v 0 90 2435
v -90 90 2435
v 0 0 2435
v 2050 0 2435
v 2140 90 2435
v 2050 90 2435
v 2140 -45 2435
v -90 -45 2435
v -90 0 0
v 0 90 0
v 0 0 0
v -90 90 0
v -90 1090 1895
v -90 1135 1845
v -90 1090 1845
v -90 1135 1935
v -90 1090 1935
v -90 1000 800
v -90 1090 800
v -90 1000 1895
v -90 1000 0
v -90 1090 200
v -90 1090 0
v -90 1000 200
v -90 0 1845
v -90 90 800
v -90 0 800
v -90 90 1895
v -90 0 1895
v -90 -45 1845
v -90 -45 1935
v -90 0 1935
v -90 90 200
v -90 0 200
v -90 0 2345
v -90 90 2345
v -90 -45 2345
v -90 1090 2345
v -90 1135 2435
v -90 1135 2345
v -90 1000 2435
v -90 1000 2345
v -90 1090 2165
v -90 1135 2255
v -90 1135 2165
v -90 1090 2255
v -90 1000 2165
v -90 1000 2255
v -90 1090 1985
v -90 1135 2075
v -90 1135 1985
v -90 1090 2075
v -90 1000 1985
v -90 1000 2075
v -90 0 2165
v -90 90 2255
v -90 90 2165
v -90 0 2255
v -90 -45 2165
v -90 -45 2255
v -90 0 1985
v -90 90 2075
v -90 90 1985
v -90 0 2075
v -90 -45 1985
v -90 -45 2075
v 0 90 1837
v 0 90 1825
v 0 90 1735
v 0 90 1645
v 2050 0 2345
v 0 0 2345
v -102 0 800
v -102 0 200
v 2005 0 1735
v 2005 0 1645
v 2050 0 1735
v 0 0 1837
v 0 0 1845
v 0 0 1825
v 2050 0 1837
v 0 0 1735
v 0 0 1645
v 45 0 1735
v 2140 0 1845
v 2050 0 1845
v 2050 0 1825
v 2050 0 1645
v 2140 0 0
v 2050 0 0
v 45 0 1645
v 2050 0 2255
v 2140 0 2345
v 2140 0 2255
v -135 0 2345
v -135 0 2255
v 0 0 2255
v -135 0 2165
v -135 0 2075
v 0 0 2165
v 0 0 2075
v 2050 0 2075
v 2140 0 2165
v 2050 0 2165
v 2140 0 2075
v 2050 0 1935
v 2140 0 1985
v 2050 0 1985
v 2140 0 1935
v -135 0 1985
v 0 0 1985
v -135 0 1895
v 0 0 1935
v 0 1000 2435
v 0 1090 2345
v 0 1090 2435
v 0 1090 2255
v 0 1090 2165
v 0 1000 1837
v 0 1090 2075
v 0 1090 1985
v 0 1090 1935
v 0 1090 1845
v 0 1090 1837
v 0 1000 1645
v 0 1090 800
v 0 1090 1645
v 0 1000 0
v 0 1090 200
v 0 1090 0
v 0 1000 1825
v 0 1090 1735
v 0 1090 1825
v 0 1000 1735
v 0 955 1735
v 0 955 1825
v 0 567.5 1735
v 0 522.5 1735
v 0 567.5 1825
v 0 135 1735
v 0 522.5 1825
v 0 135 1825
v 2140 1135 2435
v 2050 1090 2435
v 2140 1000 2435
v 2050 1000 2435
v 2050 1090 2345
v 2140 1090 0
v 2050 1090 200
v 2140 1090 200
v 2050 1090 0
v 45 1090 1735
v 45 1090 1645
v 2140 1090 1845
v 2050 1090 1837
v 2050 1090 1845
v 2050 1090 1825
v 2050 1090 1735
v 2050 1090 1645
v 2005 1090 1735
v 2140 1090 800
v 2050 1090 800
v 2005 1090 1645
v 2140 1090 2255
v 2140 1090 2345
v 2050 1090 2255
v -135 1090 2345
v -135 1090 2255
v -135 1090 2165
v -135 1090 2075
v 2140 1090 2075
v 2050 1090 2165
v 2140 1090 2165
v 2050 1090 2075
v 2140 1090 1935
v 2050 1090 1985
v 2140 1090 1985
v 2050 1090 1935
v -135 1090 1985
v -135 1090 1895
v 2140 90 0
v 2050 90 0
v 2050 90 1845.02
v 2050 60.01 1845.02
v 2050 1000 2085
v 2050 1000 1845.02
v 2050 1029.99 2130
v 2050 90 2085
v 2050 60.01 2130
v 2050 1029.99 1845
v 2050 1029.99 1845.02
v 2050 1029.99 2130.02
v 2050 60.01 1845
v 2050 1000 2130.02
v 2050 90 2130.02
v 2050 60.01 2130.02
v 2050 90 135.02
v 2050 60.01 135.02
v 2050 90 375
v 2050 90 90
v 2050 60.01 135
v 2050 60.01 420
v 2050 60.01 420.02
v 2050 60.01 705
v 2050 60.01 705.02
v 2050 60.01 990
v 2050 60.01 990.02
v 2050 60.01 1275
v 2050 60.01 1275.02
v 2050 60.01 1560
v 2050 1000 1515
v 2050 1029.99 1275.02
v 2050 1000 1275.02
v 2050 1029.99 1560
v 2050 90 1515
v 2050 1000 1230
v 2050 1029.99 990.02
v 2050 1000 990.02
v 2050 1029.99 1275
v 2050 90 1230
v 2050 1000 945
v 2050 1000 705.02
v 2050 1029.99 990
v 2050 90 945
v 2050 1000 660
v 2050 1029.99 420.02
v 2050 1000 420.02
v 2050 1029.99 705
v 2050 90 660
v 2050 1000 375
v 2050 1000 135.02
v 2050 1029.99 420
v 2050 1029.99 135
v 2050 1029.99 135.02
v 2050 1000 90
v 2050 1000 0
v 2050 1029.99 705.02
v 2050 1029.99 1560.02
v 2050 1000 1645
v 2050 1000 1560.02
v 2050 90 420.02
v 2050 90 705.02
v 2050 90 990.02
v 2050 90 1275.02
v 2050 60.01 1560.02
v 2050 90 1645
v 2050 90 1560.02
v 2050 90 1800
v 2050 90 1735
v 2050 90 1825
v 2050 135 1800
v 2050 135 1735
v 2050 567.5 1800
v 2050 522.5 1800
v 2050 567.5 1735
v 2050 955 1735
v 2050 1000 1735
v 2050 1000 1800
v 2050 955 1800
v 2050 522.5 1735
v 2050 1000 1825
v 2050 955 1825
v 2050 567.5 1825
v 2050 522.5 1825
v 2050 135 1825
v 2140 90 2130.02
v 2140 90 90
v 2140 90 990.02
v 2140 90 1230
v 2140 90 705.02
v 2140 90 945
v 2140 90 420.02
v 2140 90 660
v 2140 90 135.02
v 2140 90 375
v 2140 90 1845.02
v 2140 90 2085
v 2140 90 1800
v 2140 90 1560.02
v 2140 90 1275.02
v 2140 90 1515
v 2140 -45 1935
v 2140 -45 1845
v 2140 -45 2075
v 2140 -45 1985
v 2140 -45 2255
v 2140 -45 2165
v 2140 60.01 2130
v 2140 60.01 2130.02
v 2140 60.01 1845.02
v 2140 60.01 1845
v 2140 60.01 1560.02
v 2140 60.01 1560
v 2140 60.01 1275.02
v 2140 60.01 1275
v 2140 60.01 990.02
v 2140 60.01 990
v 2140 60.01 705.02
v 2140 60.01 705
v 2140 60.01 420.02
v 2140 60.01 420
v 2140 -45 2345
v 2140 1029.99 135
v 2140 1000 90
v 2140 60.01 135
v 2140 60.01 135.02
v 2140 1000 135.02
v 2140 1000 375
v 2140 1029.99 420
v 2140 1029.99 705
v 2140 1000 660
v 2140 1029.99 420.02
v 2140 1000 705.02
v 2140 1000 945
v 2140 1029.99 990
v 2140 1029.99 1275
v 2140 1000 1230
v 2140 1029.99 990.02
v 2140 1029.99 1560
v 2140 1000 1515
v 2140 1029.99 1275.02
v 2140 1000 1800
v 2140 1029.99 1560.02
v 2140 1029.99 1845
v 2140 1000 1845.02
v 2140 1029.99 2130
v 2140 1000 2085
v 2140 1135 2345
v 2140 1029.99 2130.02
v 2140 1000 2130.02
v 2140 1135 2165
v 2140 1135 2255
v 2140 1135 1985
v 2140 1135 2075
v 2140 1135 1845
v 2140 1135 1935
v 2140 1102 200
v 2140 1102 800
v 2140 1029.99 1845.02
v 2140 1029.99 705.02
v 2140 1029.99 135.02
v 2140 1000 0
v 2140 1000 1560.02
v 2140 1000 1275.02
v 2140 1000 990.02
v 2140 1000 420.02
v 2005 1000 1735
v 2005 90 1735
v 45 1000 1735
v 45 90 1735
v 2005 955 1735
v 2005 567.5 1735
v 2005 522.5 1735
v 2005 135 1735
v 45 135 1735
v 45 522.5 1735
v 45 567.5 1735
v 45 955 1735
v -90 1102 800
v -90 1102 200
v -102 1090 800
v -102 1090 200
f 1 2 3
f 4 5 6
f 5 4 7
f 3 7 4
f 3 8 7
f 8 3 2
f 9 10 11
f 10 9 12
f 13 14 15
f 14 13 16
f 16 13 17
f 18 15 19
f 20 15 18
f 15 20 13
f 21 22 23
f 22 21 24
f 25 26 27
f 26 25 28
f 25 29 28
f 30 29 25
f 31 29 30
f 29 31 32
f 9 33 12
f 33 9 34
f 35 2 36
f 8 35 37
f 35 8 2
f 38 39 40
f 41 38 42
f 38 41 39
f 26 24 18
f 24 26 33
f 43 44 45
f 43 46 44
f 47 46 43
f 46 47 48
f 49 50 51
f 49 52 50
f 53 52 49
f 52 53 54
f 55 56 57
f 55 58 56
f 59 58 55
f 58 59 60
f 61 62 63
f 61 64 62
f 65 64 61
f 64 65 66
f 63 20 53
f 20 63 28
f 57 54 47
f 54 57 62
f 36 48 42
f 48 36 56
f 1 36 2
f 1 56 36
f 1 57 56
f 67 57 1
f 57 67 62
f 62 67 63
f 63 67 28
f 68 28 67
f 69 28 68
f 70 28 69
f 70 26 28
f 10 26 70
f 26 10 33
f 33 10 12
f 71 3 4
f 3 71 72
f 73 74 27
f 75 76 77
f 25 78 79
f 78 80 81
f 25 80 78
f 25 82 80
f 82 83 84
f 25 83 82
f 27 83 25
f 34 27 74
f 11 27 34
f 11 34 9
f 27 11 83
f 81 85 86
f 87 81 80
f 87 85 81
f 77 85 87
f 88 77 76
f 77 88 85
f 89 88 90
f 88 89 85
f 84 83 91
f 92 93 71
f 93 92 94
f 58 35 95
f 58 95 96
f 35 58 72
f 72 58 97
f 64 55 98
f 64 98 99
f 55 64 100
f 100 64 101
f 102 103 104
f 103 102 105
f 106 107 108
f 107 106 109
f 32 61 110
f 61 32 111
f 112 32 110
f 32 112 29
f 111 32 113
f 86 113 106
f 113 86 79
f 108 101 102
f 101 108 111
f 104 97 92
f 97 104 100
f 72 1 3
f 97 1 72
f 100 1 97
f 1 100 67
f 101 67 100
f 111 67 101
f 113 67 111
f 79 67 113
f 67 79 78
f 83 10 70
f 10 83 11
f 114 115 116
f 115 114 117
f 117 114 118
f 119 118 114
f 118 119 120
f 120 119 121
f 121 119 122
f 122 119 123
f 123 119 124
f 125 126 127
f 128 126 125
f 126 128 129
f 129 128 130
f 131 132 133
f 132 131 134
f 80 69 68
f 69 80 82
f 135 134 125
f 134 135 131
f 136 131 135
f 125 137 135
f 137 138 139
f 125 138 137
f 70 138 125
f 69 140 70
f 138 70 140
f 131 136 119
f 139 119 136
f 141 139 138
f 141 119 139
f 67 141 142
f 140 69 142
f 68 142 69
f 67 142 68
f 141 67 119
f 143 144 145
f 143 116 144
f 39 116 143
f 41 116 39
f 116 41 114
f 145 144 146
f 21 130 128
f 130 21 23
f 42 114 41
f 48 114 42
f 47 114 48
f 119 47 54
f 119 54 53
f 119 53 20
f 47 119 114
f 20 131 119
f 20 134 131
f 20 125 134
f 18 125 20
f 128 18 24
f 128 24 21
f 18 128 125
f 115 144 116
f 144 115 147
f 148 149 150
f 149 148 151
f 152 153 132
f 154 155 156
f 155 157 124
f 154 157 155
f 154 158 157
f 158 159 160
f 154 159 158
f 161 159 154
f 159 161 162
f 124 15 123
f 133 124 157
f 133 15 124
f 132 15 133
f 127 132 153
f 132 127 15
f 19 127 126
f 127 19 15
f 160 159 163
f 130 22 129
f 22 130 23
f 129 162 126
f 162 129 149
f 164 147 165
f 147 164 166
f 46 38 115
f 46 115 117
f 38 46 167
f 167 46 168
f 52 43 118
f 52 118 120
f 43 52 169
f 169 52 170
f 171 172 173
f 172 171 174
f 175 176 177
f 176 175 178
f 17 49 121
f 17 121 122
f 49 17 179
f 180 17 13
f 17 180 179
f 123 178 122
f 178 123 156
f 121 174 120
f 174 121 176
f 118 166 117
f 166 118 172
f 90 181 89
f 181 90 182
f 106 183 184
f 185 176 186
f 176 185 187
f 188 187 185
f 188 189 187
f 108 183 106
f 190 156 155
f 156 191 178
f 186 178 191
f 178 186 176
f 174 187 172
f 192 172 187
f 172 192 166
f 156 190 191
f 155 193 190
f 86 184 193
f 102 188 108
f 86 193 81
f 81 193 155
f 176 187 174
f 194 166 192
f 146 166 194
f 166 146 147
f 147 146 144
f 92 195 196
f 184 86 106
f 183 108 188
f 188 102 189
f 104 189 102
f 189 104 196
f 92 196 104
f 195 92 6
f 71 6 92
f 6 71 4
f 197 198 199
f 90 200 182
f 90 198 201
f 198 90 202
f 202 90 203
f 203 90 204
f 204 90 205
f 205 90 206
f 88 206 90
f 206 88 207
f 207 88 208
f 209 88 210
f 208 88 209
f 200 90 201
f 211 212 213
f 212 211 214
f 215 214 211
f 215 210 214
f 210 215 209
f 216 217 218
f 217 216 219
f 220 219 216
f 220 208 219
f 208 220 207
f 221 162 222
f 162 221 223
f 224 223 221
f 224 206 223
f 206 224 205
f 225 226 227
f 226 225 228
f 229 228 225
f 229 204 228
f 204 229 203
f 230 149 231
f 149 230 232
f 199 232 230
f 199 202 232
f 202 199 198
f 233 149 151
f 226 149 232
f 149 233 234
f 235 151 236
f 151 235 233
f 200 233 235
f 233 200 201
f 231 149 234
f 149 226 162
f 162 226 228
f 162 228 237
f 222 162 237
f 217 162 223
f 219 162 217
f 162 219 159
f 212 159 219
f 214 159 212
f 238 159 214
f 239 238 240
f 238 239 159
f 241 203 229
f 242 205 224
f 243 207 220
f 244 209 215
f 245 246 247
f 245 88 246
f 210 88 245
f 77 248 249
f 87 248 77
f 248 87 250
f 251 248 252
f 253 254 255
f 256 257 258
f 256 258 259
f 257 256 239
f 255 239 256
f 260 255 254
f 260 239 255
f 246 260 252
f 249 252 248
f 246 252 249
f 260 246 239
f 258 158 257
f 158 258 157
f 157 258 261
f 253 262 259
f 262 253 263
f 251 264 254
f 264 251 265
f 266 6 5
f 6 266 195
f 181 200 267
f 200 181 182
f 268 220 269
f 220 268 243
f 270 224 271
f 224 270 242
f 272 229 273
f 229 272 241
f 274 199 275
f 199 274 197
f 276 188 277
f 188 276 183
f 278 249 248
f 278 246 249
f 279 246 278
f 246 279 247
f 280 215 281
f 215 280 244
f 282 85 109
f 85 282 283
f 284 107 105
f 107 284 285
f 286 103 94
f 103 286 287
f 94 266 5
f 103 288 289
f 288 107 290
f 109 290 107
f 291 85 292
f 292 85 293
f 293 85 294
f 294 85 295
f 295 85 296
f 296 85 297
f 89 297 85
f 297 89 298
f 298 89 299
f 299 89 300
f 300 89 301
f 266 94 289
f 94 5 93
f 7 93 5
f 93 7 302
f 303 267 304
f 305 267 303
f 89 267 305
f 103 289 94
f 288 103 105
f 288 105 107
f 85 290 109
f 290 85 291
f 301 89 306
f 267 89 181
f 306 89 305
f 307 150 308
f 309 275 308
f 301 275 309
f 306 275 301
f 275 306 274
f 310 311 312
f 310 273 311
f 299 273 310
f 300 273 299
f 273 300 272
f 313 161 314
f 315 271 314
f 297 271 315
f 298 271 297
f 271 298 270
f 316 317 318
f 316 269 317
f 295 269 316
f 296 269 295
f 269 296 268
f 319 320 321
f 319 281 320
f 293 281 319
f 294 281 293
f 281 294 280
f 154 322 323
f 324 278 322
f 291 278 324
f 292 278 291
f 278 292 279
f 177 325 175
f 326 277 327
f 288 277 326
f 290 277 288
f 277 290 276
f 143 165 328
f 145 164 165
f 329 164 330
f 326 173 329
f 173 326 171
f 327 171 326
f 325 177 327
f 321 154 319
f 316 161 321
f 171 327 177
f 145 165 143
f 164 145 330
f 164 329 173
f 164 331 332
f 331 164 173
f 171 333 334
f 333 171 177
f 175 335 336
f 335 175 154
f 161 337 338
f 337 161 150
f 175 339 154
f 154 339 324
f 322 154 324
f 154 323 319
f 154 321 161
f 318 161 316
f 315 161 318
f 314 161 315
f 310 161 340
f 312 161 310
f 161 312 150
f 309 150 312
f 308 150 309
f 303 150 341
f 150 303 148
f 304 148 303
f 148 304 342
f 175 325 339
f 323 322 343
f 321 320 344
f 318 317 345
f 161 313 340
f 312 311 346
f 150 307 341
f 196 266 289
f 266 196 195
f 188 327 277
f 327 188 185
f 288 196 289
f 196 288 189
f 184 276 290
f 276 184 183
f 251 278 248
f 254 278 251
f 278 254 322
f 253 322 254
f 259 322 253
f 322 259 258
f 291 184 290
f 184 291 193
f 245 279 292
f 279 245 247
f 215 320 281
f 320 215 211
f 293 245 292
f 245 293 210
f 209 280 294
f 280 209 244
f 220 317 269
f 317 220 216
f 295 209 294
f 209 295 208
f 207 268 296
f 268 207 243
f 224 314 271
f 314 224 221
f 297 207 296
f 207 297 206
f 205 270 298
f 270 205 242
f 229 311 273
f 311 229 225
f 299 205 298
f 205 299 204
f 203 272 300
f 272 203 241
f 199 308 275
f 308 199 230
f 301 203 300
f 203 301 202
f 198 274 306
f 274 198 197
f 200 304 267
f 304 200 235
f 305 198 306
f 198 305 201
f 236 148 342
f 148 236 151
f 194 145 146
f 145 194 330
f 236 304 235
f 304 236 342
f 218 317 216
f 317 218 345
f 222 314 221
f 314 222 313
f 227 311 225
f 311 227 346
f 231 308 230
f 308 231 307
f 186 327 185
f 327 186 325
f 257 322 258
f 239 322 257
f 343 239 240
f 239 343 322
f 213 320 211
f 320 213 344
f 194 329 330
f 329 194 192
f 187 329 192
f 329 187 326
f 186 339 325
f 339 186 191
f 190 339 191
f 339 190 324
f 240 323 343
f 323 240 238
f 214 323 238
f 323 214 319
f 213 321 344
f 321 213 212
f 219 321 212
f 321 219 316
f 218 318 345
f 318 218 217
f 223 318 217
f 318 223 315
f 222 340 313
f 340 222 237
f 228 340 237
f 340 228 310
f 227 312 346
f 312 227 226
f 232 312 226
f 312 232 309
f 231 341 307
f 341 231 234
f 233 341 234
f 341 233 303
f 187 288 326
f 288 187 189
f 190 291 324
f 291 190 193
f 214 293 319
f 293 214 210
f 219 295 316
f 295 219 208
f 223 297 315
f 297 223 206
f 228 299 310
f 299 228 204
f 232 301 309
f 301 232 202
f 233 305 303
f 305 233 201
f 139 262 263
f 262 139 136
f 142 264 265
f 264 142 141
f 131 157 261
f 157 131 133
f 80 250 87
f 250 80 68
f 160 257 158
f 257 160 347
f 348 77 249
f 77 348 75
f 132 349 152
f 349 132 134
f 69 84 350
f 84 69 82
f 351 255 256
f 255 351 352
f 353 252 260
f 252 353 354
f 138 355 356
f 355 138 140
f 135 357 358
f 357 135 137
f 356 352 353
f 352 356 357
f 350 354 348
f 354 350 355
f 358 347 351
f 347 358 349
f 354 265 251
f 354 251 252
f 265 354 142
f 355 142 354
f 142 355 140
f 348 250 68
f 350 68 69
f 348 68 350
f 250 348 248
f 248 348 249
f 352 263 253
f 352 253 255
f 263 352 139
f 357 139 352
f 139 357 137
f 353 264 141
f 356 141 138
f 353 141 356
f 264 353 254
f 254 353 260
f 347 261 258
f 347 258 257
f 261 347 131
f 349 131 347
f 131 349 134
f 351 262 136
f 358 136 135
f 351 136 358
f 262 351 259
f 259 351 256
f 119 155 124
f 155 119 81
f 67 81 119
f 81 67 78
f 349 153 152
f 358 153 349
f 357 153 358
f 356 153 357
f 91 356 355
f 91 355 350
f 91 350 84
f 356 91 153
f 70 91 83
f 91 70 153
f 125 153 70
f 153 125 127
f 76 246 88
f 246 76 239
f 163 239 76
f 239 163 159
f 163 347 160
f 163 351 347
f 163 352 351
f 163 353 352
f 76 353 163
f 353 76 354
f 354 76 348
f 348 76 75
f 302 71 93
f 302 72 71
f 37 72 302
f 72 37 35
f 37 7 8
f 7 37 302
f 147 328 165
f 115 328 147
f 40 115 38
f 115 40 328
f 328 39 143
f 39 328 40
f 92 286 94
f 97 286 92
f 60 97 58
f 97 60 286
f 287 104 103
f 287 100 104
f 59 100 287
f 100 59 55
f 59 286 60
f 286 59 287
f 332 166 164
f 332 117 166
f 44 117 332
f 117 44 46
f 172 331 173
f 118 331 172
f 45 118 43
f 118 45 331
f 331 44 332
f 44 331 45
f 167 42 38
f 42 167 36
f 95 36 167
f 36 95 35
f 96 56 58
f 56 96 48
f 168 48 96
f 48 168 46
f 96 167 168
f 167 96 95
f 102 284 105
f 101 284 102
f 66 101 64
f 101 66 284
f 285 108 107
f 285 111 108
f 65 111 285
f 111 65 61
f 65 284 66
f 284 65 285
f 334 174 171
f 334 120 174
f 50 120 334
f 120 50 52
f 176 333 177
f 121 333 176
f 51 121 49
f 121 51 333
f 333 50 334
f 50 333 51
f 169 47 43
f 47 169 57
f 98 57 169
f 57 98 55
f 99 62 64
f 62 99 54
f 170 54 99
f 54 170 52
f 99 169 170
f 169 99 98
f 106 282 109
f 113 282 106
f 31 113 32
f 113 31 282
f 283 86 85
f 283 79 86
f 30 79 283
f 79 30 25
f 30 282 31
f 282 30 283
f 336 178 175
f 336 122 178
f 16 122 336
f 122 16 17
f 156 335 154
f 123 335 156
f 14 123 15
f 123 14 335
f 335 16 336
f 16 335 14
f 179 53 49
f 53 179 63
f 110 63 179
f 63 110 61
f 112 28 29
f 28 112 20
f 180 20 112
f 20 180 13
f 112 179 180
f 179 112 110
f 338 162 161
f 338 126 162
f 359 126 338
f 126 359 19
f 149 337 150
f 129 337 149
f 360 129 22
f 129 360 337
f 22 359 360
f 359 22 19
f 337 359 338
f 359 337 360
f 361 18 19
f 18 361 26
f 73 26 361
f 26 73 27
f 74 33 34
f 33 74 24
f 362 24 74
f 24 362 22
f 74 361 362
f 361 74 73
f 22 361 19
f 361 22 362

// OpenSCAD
// Loft bunk-bed loft frame. See ./README.md for BOM, tools, and assembly.
// Render the whole thing (default) or any sub-assembly by overriding `view`
// on the CLI, e.g. `openscad -D 'view="post"' loft.scad`. See the dispatch
// block at the bottom of this file for the supported view names.

view = "all"; // "all" | "side_a" | "side_b" | "bed_frame" | "safety_rails" | "post" | "post_blank"


eps = 0.01;

b45x45 = [45, 45];
b45x90 = [45, 90];
b45x140 = [45, 140];
b45x190 = [45, 190];
b45x240 = [45, 240];
b45x290 = [45, 290];
b25x100 = [25, 100];
b25x150 = [25, 150];
b25x200 = [25, 200];
b25x300 = [25, 300];

ladder_rungs = 8;
ladder_gap = 240;
ladder_spacing = ladder_gap + b45x90[0];
ladder_height = b45x90[1] + (ladder_rungs - 1) * ladder_spacing;
ladder_start = 90; // bottom rung shelf, as built. Rung 1 top is 1845.
ladder_notch = 30;
// SAFETY: ladder gap is 240mm
echo(ladder_gap = ladder_gap);
echo(ladder_height = ladder_height);

post_height = 2435;
bed_height = 1735; // joist bottom. Raised 20 from the original design, see README step 5.
bed_length = 2030 + 20; // 10mm clearance on each side
bed_width = 1070 + 20; // 10mm clearance on each side
side_width = bed_width - 2 * b45x90[1];
panel_thickness = 12;
slat_count = 6;
slat_width = 200;
safety_rungs = 4;
support_bottom = 200;
// The lowest long rail (tier 3) sits 40 mm above the 1805 it would have at even
// spacing. Its centred bolt lands at 1890, 45 mm above the top of rung 1, so a
// drill body fits to cut the 25 mm nut recess on the ladder's inner face.
rail_tier3_lift = 40;
safety_gap = 90; // between rail tiers, except 50 above tier 3
support_height = 600;

// SAFETY: end gap is 60mm
echo(end_gap = ladder_gap - 2 * b45x90[1]);

// beams

module beam_zx(beam_size, length) {
  cube([beam_size[1], beam_size[0], length]);
}

module beam_zy(beam_size, length) {
  cube([beam_size[0], beam_size[1], length]);
}

module beam_yz(beam_size, length) {
  cube([beam_size[0], length, beam_size[1]]);
}

module beam_yx(beam_size, length) {
  cube([beam_size[1], length, beam_size[0]]);
}

module beam_xz(beam_size, length) {
  cube([length, beam_size[0], beam_size[1]]);
}

module beam_xy(beam_size, length) {
  cube([length, beam_size[1], beam_size[0]]);
}

module panel_xy(length, width) {
  cube([length, width, panel_thickness]);
}

module panel_xz(length, width) {
  cube([length, panel_thickness, width]);
}

module panel_yz(length, width) {
  cube([panel_thickness, length, width]);
}

// post

module post_front() {
  color("green")
  beam_zy(b45x90, post_height);
}

module post_back() {
  color("blue")
  translate([
    b45x90[0],
    0
  ])
  beam_zy(b45x90, post_height);
}

module post(has_ladder) {
  difference() {
    union() {
      post_front();
      post_back();
    }

    if (has_ladder) {
      translate([
        -eps,
        b45x90[1] - ladder_notch + eps,
        0,
      ])
      ladder_rungs_iter() {
        beam_yx(b45x90 + [2 * eps, 2 * eps], ladder_notch + eps);
      }
    }
  }
}

module side(side_id) {
  has_ladder = side_id == "b";

  post(has_ladder);

  translate([0, bed_width])
  mirror([0, 1, 0])
  post(has_ladder);

  if (has_ladder) {
    ladder_rungs_iter(print = true) {
      translate([0, b45x90[1] - ladder_notch, 0])
      color("red")
      beam_yx(b45x90, bed_width - 2 * (b45x90[1] - ladder_notch));
    }
  }
}

module ladder_rungs_iter(print = false) {
  spacing = (ladder_height - 2 * b45x90[0]) / (ladder_rungs - 1);
  if (print) {
    // SAFETY: ladder gap is 240mm
    echo(ladder_gap = spacing - b45x90[0]);
  }

  for (ladder_index = [0: ladder_rungs - 1]) {
    top = ladder_start + ladder_height - (ladder_index * spacing);

    if (print) {
      echo(ladder_index = ladder_index, ladder_top = top);
    }

    translate([
      0,
      0,
      top - b45x90[1]
    ])
    children();
  }
}

module bed_frame(with_panel = true) {
  color("yellow")
  translate([0, b45x90[1]])
  beam_xz(b45x90, bed_length);

  color("yellow")
  translate([0, b45x90[1] + (1/2) * (side_width - b45x90[0])])
  beam_xz(b45x90, bed_length);

  color("yellow")
  translate([0, side_width + b45x90[0]])
  beam_xz(b45x90, bed_length);

  if (with_panel) {
    color("orange")
    translate([0, 0, b45x90[1]])
    panel_xy(bed_length, bed_width);
  }

  // support sides
  color("cyan")
  translate([0, 0, -b45x90[1]])
  beam_yz(b45x90, bed_width);

  color("cyan")
  translate([bed_length - b45x90[0], 0, -b45x90[1]])
  beam_yz(b45x90, bed_width);
}

module front_support_panel() {
  color("teal")
  translate([
    -2 * b45x90[0] - panel_thickness,
    0,
    support_bottom,
  ])
  panel_yz(bed_width, support_height);
}

module side_support_panel() {
  color("purple")
  translate([
    -2 * b45x90[0],
    bed_width,
    support_bottom,
  ])
  panel_xz(bed_length + 4 * b45x90[0], support_height);
}

module safety_rail(is_top, lift = 0) {
  // front
  color("pink")
  translate([
    -2 * b45x90[0],
    -1 * b45x90[0],
    -b45x90[1] + lift,
  ])
  beam_xz(b45x90, bed_length + 4 * b45x90[0]);

  // back
  color("pink")
  translate([
    -2 * b45x90[0],
    bed_width,
    -b45x90[1] + lift,
  ])
  beam_xz(b45x90, bed_length + 4 * b45x90[0]);

  // side
  if (!is_top) {
    color("pink")
    translate([
      -3 * b45x90[0],
      0,
      0
    ])
    beam_yz(b45x90, bed_width);
  }
}

module safety_rails() {
  spacing = b45x90[1] + safety_gap;
  // SAFETY: safety gap is 90mm, 50mm above tier 3 (rail_tier3_lift)
  echo(safety_gap = safety_gap, bottom_gap = safety_gap - rail_tier3_lift);

  for (safety_index = [0: safety_rungs - 1]) {
    is_top = safety_index == 0;
    is_bottom = safety_index == safety_rungs - 1;
    top = post_height - (safety_index * spacing);
    lift = is_bottom ? rail_tier3_lift : 0;
    echo(safety_index = safety_index, long_rail_bottom = top - b45x90[1] + lift, long_rail_top = top + lift);

    translate([0, 0, top])
    safety_rail(is_top, lift);
  }
}

module loft() {
  translate([
    -2 * b45x90[0],
    0,
  ])
  side("a");

  translate([
    bed_length,
    0,
  ])
  side("b");

  translate([
    0,
    0,
    bed_height
  ])
  bed_frame();

  side_support_panel();

  front_support_panel();

  safety_rails();
}

if      (view == "all")          loft();
else if (view == "side_a")       side("a");
else if (view == "side_b")       side("b");
else if (view == "bed_frame")    bed_frame(with_panel = false);
else if (view == "safety_rails") safety_rails();
else if (view == "post")         rotate([0, 90, 0]) post(true);
else if (view == "post_blank")   rotate([0, 90, 0]) post(false);
else assert(false, str("unknown view: ", view, " (see header for valid names)"));
